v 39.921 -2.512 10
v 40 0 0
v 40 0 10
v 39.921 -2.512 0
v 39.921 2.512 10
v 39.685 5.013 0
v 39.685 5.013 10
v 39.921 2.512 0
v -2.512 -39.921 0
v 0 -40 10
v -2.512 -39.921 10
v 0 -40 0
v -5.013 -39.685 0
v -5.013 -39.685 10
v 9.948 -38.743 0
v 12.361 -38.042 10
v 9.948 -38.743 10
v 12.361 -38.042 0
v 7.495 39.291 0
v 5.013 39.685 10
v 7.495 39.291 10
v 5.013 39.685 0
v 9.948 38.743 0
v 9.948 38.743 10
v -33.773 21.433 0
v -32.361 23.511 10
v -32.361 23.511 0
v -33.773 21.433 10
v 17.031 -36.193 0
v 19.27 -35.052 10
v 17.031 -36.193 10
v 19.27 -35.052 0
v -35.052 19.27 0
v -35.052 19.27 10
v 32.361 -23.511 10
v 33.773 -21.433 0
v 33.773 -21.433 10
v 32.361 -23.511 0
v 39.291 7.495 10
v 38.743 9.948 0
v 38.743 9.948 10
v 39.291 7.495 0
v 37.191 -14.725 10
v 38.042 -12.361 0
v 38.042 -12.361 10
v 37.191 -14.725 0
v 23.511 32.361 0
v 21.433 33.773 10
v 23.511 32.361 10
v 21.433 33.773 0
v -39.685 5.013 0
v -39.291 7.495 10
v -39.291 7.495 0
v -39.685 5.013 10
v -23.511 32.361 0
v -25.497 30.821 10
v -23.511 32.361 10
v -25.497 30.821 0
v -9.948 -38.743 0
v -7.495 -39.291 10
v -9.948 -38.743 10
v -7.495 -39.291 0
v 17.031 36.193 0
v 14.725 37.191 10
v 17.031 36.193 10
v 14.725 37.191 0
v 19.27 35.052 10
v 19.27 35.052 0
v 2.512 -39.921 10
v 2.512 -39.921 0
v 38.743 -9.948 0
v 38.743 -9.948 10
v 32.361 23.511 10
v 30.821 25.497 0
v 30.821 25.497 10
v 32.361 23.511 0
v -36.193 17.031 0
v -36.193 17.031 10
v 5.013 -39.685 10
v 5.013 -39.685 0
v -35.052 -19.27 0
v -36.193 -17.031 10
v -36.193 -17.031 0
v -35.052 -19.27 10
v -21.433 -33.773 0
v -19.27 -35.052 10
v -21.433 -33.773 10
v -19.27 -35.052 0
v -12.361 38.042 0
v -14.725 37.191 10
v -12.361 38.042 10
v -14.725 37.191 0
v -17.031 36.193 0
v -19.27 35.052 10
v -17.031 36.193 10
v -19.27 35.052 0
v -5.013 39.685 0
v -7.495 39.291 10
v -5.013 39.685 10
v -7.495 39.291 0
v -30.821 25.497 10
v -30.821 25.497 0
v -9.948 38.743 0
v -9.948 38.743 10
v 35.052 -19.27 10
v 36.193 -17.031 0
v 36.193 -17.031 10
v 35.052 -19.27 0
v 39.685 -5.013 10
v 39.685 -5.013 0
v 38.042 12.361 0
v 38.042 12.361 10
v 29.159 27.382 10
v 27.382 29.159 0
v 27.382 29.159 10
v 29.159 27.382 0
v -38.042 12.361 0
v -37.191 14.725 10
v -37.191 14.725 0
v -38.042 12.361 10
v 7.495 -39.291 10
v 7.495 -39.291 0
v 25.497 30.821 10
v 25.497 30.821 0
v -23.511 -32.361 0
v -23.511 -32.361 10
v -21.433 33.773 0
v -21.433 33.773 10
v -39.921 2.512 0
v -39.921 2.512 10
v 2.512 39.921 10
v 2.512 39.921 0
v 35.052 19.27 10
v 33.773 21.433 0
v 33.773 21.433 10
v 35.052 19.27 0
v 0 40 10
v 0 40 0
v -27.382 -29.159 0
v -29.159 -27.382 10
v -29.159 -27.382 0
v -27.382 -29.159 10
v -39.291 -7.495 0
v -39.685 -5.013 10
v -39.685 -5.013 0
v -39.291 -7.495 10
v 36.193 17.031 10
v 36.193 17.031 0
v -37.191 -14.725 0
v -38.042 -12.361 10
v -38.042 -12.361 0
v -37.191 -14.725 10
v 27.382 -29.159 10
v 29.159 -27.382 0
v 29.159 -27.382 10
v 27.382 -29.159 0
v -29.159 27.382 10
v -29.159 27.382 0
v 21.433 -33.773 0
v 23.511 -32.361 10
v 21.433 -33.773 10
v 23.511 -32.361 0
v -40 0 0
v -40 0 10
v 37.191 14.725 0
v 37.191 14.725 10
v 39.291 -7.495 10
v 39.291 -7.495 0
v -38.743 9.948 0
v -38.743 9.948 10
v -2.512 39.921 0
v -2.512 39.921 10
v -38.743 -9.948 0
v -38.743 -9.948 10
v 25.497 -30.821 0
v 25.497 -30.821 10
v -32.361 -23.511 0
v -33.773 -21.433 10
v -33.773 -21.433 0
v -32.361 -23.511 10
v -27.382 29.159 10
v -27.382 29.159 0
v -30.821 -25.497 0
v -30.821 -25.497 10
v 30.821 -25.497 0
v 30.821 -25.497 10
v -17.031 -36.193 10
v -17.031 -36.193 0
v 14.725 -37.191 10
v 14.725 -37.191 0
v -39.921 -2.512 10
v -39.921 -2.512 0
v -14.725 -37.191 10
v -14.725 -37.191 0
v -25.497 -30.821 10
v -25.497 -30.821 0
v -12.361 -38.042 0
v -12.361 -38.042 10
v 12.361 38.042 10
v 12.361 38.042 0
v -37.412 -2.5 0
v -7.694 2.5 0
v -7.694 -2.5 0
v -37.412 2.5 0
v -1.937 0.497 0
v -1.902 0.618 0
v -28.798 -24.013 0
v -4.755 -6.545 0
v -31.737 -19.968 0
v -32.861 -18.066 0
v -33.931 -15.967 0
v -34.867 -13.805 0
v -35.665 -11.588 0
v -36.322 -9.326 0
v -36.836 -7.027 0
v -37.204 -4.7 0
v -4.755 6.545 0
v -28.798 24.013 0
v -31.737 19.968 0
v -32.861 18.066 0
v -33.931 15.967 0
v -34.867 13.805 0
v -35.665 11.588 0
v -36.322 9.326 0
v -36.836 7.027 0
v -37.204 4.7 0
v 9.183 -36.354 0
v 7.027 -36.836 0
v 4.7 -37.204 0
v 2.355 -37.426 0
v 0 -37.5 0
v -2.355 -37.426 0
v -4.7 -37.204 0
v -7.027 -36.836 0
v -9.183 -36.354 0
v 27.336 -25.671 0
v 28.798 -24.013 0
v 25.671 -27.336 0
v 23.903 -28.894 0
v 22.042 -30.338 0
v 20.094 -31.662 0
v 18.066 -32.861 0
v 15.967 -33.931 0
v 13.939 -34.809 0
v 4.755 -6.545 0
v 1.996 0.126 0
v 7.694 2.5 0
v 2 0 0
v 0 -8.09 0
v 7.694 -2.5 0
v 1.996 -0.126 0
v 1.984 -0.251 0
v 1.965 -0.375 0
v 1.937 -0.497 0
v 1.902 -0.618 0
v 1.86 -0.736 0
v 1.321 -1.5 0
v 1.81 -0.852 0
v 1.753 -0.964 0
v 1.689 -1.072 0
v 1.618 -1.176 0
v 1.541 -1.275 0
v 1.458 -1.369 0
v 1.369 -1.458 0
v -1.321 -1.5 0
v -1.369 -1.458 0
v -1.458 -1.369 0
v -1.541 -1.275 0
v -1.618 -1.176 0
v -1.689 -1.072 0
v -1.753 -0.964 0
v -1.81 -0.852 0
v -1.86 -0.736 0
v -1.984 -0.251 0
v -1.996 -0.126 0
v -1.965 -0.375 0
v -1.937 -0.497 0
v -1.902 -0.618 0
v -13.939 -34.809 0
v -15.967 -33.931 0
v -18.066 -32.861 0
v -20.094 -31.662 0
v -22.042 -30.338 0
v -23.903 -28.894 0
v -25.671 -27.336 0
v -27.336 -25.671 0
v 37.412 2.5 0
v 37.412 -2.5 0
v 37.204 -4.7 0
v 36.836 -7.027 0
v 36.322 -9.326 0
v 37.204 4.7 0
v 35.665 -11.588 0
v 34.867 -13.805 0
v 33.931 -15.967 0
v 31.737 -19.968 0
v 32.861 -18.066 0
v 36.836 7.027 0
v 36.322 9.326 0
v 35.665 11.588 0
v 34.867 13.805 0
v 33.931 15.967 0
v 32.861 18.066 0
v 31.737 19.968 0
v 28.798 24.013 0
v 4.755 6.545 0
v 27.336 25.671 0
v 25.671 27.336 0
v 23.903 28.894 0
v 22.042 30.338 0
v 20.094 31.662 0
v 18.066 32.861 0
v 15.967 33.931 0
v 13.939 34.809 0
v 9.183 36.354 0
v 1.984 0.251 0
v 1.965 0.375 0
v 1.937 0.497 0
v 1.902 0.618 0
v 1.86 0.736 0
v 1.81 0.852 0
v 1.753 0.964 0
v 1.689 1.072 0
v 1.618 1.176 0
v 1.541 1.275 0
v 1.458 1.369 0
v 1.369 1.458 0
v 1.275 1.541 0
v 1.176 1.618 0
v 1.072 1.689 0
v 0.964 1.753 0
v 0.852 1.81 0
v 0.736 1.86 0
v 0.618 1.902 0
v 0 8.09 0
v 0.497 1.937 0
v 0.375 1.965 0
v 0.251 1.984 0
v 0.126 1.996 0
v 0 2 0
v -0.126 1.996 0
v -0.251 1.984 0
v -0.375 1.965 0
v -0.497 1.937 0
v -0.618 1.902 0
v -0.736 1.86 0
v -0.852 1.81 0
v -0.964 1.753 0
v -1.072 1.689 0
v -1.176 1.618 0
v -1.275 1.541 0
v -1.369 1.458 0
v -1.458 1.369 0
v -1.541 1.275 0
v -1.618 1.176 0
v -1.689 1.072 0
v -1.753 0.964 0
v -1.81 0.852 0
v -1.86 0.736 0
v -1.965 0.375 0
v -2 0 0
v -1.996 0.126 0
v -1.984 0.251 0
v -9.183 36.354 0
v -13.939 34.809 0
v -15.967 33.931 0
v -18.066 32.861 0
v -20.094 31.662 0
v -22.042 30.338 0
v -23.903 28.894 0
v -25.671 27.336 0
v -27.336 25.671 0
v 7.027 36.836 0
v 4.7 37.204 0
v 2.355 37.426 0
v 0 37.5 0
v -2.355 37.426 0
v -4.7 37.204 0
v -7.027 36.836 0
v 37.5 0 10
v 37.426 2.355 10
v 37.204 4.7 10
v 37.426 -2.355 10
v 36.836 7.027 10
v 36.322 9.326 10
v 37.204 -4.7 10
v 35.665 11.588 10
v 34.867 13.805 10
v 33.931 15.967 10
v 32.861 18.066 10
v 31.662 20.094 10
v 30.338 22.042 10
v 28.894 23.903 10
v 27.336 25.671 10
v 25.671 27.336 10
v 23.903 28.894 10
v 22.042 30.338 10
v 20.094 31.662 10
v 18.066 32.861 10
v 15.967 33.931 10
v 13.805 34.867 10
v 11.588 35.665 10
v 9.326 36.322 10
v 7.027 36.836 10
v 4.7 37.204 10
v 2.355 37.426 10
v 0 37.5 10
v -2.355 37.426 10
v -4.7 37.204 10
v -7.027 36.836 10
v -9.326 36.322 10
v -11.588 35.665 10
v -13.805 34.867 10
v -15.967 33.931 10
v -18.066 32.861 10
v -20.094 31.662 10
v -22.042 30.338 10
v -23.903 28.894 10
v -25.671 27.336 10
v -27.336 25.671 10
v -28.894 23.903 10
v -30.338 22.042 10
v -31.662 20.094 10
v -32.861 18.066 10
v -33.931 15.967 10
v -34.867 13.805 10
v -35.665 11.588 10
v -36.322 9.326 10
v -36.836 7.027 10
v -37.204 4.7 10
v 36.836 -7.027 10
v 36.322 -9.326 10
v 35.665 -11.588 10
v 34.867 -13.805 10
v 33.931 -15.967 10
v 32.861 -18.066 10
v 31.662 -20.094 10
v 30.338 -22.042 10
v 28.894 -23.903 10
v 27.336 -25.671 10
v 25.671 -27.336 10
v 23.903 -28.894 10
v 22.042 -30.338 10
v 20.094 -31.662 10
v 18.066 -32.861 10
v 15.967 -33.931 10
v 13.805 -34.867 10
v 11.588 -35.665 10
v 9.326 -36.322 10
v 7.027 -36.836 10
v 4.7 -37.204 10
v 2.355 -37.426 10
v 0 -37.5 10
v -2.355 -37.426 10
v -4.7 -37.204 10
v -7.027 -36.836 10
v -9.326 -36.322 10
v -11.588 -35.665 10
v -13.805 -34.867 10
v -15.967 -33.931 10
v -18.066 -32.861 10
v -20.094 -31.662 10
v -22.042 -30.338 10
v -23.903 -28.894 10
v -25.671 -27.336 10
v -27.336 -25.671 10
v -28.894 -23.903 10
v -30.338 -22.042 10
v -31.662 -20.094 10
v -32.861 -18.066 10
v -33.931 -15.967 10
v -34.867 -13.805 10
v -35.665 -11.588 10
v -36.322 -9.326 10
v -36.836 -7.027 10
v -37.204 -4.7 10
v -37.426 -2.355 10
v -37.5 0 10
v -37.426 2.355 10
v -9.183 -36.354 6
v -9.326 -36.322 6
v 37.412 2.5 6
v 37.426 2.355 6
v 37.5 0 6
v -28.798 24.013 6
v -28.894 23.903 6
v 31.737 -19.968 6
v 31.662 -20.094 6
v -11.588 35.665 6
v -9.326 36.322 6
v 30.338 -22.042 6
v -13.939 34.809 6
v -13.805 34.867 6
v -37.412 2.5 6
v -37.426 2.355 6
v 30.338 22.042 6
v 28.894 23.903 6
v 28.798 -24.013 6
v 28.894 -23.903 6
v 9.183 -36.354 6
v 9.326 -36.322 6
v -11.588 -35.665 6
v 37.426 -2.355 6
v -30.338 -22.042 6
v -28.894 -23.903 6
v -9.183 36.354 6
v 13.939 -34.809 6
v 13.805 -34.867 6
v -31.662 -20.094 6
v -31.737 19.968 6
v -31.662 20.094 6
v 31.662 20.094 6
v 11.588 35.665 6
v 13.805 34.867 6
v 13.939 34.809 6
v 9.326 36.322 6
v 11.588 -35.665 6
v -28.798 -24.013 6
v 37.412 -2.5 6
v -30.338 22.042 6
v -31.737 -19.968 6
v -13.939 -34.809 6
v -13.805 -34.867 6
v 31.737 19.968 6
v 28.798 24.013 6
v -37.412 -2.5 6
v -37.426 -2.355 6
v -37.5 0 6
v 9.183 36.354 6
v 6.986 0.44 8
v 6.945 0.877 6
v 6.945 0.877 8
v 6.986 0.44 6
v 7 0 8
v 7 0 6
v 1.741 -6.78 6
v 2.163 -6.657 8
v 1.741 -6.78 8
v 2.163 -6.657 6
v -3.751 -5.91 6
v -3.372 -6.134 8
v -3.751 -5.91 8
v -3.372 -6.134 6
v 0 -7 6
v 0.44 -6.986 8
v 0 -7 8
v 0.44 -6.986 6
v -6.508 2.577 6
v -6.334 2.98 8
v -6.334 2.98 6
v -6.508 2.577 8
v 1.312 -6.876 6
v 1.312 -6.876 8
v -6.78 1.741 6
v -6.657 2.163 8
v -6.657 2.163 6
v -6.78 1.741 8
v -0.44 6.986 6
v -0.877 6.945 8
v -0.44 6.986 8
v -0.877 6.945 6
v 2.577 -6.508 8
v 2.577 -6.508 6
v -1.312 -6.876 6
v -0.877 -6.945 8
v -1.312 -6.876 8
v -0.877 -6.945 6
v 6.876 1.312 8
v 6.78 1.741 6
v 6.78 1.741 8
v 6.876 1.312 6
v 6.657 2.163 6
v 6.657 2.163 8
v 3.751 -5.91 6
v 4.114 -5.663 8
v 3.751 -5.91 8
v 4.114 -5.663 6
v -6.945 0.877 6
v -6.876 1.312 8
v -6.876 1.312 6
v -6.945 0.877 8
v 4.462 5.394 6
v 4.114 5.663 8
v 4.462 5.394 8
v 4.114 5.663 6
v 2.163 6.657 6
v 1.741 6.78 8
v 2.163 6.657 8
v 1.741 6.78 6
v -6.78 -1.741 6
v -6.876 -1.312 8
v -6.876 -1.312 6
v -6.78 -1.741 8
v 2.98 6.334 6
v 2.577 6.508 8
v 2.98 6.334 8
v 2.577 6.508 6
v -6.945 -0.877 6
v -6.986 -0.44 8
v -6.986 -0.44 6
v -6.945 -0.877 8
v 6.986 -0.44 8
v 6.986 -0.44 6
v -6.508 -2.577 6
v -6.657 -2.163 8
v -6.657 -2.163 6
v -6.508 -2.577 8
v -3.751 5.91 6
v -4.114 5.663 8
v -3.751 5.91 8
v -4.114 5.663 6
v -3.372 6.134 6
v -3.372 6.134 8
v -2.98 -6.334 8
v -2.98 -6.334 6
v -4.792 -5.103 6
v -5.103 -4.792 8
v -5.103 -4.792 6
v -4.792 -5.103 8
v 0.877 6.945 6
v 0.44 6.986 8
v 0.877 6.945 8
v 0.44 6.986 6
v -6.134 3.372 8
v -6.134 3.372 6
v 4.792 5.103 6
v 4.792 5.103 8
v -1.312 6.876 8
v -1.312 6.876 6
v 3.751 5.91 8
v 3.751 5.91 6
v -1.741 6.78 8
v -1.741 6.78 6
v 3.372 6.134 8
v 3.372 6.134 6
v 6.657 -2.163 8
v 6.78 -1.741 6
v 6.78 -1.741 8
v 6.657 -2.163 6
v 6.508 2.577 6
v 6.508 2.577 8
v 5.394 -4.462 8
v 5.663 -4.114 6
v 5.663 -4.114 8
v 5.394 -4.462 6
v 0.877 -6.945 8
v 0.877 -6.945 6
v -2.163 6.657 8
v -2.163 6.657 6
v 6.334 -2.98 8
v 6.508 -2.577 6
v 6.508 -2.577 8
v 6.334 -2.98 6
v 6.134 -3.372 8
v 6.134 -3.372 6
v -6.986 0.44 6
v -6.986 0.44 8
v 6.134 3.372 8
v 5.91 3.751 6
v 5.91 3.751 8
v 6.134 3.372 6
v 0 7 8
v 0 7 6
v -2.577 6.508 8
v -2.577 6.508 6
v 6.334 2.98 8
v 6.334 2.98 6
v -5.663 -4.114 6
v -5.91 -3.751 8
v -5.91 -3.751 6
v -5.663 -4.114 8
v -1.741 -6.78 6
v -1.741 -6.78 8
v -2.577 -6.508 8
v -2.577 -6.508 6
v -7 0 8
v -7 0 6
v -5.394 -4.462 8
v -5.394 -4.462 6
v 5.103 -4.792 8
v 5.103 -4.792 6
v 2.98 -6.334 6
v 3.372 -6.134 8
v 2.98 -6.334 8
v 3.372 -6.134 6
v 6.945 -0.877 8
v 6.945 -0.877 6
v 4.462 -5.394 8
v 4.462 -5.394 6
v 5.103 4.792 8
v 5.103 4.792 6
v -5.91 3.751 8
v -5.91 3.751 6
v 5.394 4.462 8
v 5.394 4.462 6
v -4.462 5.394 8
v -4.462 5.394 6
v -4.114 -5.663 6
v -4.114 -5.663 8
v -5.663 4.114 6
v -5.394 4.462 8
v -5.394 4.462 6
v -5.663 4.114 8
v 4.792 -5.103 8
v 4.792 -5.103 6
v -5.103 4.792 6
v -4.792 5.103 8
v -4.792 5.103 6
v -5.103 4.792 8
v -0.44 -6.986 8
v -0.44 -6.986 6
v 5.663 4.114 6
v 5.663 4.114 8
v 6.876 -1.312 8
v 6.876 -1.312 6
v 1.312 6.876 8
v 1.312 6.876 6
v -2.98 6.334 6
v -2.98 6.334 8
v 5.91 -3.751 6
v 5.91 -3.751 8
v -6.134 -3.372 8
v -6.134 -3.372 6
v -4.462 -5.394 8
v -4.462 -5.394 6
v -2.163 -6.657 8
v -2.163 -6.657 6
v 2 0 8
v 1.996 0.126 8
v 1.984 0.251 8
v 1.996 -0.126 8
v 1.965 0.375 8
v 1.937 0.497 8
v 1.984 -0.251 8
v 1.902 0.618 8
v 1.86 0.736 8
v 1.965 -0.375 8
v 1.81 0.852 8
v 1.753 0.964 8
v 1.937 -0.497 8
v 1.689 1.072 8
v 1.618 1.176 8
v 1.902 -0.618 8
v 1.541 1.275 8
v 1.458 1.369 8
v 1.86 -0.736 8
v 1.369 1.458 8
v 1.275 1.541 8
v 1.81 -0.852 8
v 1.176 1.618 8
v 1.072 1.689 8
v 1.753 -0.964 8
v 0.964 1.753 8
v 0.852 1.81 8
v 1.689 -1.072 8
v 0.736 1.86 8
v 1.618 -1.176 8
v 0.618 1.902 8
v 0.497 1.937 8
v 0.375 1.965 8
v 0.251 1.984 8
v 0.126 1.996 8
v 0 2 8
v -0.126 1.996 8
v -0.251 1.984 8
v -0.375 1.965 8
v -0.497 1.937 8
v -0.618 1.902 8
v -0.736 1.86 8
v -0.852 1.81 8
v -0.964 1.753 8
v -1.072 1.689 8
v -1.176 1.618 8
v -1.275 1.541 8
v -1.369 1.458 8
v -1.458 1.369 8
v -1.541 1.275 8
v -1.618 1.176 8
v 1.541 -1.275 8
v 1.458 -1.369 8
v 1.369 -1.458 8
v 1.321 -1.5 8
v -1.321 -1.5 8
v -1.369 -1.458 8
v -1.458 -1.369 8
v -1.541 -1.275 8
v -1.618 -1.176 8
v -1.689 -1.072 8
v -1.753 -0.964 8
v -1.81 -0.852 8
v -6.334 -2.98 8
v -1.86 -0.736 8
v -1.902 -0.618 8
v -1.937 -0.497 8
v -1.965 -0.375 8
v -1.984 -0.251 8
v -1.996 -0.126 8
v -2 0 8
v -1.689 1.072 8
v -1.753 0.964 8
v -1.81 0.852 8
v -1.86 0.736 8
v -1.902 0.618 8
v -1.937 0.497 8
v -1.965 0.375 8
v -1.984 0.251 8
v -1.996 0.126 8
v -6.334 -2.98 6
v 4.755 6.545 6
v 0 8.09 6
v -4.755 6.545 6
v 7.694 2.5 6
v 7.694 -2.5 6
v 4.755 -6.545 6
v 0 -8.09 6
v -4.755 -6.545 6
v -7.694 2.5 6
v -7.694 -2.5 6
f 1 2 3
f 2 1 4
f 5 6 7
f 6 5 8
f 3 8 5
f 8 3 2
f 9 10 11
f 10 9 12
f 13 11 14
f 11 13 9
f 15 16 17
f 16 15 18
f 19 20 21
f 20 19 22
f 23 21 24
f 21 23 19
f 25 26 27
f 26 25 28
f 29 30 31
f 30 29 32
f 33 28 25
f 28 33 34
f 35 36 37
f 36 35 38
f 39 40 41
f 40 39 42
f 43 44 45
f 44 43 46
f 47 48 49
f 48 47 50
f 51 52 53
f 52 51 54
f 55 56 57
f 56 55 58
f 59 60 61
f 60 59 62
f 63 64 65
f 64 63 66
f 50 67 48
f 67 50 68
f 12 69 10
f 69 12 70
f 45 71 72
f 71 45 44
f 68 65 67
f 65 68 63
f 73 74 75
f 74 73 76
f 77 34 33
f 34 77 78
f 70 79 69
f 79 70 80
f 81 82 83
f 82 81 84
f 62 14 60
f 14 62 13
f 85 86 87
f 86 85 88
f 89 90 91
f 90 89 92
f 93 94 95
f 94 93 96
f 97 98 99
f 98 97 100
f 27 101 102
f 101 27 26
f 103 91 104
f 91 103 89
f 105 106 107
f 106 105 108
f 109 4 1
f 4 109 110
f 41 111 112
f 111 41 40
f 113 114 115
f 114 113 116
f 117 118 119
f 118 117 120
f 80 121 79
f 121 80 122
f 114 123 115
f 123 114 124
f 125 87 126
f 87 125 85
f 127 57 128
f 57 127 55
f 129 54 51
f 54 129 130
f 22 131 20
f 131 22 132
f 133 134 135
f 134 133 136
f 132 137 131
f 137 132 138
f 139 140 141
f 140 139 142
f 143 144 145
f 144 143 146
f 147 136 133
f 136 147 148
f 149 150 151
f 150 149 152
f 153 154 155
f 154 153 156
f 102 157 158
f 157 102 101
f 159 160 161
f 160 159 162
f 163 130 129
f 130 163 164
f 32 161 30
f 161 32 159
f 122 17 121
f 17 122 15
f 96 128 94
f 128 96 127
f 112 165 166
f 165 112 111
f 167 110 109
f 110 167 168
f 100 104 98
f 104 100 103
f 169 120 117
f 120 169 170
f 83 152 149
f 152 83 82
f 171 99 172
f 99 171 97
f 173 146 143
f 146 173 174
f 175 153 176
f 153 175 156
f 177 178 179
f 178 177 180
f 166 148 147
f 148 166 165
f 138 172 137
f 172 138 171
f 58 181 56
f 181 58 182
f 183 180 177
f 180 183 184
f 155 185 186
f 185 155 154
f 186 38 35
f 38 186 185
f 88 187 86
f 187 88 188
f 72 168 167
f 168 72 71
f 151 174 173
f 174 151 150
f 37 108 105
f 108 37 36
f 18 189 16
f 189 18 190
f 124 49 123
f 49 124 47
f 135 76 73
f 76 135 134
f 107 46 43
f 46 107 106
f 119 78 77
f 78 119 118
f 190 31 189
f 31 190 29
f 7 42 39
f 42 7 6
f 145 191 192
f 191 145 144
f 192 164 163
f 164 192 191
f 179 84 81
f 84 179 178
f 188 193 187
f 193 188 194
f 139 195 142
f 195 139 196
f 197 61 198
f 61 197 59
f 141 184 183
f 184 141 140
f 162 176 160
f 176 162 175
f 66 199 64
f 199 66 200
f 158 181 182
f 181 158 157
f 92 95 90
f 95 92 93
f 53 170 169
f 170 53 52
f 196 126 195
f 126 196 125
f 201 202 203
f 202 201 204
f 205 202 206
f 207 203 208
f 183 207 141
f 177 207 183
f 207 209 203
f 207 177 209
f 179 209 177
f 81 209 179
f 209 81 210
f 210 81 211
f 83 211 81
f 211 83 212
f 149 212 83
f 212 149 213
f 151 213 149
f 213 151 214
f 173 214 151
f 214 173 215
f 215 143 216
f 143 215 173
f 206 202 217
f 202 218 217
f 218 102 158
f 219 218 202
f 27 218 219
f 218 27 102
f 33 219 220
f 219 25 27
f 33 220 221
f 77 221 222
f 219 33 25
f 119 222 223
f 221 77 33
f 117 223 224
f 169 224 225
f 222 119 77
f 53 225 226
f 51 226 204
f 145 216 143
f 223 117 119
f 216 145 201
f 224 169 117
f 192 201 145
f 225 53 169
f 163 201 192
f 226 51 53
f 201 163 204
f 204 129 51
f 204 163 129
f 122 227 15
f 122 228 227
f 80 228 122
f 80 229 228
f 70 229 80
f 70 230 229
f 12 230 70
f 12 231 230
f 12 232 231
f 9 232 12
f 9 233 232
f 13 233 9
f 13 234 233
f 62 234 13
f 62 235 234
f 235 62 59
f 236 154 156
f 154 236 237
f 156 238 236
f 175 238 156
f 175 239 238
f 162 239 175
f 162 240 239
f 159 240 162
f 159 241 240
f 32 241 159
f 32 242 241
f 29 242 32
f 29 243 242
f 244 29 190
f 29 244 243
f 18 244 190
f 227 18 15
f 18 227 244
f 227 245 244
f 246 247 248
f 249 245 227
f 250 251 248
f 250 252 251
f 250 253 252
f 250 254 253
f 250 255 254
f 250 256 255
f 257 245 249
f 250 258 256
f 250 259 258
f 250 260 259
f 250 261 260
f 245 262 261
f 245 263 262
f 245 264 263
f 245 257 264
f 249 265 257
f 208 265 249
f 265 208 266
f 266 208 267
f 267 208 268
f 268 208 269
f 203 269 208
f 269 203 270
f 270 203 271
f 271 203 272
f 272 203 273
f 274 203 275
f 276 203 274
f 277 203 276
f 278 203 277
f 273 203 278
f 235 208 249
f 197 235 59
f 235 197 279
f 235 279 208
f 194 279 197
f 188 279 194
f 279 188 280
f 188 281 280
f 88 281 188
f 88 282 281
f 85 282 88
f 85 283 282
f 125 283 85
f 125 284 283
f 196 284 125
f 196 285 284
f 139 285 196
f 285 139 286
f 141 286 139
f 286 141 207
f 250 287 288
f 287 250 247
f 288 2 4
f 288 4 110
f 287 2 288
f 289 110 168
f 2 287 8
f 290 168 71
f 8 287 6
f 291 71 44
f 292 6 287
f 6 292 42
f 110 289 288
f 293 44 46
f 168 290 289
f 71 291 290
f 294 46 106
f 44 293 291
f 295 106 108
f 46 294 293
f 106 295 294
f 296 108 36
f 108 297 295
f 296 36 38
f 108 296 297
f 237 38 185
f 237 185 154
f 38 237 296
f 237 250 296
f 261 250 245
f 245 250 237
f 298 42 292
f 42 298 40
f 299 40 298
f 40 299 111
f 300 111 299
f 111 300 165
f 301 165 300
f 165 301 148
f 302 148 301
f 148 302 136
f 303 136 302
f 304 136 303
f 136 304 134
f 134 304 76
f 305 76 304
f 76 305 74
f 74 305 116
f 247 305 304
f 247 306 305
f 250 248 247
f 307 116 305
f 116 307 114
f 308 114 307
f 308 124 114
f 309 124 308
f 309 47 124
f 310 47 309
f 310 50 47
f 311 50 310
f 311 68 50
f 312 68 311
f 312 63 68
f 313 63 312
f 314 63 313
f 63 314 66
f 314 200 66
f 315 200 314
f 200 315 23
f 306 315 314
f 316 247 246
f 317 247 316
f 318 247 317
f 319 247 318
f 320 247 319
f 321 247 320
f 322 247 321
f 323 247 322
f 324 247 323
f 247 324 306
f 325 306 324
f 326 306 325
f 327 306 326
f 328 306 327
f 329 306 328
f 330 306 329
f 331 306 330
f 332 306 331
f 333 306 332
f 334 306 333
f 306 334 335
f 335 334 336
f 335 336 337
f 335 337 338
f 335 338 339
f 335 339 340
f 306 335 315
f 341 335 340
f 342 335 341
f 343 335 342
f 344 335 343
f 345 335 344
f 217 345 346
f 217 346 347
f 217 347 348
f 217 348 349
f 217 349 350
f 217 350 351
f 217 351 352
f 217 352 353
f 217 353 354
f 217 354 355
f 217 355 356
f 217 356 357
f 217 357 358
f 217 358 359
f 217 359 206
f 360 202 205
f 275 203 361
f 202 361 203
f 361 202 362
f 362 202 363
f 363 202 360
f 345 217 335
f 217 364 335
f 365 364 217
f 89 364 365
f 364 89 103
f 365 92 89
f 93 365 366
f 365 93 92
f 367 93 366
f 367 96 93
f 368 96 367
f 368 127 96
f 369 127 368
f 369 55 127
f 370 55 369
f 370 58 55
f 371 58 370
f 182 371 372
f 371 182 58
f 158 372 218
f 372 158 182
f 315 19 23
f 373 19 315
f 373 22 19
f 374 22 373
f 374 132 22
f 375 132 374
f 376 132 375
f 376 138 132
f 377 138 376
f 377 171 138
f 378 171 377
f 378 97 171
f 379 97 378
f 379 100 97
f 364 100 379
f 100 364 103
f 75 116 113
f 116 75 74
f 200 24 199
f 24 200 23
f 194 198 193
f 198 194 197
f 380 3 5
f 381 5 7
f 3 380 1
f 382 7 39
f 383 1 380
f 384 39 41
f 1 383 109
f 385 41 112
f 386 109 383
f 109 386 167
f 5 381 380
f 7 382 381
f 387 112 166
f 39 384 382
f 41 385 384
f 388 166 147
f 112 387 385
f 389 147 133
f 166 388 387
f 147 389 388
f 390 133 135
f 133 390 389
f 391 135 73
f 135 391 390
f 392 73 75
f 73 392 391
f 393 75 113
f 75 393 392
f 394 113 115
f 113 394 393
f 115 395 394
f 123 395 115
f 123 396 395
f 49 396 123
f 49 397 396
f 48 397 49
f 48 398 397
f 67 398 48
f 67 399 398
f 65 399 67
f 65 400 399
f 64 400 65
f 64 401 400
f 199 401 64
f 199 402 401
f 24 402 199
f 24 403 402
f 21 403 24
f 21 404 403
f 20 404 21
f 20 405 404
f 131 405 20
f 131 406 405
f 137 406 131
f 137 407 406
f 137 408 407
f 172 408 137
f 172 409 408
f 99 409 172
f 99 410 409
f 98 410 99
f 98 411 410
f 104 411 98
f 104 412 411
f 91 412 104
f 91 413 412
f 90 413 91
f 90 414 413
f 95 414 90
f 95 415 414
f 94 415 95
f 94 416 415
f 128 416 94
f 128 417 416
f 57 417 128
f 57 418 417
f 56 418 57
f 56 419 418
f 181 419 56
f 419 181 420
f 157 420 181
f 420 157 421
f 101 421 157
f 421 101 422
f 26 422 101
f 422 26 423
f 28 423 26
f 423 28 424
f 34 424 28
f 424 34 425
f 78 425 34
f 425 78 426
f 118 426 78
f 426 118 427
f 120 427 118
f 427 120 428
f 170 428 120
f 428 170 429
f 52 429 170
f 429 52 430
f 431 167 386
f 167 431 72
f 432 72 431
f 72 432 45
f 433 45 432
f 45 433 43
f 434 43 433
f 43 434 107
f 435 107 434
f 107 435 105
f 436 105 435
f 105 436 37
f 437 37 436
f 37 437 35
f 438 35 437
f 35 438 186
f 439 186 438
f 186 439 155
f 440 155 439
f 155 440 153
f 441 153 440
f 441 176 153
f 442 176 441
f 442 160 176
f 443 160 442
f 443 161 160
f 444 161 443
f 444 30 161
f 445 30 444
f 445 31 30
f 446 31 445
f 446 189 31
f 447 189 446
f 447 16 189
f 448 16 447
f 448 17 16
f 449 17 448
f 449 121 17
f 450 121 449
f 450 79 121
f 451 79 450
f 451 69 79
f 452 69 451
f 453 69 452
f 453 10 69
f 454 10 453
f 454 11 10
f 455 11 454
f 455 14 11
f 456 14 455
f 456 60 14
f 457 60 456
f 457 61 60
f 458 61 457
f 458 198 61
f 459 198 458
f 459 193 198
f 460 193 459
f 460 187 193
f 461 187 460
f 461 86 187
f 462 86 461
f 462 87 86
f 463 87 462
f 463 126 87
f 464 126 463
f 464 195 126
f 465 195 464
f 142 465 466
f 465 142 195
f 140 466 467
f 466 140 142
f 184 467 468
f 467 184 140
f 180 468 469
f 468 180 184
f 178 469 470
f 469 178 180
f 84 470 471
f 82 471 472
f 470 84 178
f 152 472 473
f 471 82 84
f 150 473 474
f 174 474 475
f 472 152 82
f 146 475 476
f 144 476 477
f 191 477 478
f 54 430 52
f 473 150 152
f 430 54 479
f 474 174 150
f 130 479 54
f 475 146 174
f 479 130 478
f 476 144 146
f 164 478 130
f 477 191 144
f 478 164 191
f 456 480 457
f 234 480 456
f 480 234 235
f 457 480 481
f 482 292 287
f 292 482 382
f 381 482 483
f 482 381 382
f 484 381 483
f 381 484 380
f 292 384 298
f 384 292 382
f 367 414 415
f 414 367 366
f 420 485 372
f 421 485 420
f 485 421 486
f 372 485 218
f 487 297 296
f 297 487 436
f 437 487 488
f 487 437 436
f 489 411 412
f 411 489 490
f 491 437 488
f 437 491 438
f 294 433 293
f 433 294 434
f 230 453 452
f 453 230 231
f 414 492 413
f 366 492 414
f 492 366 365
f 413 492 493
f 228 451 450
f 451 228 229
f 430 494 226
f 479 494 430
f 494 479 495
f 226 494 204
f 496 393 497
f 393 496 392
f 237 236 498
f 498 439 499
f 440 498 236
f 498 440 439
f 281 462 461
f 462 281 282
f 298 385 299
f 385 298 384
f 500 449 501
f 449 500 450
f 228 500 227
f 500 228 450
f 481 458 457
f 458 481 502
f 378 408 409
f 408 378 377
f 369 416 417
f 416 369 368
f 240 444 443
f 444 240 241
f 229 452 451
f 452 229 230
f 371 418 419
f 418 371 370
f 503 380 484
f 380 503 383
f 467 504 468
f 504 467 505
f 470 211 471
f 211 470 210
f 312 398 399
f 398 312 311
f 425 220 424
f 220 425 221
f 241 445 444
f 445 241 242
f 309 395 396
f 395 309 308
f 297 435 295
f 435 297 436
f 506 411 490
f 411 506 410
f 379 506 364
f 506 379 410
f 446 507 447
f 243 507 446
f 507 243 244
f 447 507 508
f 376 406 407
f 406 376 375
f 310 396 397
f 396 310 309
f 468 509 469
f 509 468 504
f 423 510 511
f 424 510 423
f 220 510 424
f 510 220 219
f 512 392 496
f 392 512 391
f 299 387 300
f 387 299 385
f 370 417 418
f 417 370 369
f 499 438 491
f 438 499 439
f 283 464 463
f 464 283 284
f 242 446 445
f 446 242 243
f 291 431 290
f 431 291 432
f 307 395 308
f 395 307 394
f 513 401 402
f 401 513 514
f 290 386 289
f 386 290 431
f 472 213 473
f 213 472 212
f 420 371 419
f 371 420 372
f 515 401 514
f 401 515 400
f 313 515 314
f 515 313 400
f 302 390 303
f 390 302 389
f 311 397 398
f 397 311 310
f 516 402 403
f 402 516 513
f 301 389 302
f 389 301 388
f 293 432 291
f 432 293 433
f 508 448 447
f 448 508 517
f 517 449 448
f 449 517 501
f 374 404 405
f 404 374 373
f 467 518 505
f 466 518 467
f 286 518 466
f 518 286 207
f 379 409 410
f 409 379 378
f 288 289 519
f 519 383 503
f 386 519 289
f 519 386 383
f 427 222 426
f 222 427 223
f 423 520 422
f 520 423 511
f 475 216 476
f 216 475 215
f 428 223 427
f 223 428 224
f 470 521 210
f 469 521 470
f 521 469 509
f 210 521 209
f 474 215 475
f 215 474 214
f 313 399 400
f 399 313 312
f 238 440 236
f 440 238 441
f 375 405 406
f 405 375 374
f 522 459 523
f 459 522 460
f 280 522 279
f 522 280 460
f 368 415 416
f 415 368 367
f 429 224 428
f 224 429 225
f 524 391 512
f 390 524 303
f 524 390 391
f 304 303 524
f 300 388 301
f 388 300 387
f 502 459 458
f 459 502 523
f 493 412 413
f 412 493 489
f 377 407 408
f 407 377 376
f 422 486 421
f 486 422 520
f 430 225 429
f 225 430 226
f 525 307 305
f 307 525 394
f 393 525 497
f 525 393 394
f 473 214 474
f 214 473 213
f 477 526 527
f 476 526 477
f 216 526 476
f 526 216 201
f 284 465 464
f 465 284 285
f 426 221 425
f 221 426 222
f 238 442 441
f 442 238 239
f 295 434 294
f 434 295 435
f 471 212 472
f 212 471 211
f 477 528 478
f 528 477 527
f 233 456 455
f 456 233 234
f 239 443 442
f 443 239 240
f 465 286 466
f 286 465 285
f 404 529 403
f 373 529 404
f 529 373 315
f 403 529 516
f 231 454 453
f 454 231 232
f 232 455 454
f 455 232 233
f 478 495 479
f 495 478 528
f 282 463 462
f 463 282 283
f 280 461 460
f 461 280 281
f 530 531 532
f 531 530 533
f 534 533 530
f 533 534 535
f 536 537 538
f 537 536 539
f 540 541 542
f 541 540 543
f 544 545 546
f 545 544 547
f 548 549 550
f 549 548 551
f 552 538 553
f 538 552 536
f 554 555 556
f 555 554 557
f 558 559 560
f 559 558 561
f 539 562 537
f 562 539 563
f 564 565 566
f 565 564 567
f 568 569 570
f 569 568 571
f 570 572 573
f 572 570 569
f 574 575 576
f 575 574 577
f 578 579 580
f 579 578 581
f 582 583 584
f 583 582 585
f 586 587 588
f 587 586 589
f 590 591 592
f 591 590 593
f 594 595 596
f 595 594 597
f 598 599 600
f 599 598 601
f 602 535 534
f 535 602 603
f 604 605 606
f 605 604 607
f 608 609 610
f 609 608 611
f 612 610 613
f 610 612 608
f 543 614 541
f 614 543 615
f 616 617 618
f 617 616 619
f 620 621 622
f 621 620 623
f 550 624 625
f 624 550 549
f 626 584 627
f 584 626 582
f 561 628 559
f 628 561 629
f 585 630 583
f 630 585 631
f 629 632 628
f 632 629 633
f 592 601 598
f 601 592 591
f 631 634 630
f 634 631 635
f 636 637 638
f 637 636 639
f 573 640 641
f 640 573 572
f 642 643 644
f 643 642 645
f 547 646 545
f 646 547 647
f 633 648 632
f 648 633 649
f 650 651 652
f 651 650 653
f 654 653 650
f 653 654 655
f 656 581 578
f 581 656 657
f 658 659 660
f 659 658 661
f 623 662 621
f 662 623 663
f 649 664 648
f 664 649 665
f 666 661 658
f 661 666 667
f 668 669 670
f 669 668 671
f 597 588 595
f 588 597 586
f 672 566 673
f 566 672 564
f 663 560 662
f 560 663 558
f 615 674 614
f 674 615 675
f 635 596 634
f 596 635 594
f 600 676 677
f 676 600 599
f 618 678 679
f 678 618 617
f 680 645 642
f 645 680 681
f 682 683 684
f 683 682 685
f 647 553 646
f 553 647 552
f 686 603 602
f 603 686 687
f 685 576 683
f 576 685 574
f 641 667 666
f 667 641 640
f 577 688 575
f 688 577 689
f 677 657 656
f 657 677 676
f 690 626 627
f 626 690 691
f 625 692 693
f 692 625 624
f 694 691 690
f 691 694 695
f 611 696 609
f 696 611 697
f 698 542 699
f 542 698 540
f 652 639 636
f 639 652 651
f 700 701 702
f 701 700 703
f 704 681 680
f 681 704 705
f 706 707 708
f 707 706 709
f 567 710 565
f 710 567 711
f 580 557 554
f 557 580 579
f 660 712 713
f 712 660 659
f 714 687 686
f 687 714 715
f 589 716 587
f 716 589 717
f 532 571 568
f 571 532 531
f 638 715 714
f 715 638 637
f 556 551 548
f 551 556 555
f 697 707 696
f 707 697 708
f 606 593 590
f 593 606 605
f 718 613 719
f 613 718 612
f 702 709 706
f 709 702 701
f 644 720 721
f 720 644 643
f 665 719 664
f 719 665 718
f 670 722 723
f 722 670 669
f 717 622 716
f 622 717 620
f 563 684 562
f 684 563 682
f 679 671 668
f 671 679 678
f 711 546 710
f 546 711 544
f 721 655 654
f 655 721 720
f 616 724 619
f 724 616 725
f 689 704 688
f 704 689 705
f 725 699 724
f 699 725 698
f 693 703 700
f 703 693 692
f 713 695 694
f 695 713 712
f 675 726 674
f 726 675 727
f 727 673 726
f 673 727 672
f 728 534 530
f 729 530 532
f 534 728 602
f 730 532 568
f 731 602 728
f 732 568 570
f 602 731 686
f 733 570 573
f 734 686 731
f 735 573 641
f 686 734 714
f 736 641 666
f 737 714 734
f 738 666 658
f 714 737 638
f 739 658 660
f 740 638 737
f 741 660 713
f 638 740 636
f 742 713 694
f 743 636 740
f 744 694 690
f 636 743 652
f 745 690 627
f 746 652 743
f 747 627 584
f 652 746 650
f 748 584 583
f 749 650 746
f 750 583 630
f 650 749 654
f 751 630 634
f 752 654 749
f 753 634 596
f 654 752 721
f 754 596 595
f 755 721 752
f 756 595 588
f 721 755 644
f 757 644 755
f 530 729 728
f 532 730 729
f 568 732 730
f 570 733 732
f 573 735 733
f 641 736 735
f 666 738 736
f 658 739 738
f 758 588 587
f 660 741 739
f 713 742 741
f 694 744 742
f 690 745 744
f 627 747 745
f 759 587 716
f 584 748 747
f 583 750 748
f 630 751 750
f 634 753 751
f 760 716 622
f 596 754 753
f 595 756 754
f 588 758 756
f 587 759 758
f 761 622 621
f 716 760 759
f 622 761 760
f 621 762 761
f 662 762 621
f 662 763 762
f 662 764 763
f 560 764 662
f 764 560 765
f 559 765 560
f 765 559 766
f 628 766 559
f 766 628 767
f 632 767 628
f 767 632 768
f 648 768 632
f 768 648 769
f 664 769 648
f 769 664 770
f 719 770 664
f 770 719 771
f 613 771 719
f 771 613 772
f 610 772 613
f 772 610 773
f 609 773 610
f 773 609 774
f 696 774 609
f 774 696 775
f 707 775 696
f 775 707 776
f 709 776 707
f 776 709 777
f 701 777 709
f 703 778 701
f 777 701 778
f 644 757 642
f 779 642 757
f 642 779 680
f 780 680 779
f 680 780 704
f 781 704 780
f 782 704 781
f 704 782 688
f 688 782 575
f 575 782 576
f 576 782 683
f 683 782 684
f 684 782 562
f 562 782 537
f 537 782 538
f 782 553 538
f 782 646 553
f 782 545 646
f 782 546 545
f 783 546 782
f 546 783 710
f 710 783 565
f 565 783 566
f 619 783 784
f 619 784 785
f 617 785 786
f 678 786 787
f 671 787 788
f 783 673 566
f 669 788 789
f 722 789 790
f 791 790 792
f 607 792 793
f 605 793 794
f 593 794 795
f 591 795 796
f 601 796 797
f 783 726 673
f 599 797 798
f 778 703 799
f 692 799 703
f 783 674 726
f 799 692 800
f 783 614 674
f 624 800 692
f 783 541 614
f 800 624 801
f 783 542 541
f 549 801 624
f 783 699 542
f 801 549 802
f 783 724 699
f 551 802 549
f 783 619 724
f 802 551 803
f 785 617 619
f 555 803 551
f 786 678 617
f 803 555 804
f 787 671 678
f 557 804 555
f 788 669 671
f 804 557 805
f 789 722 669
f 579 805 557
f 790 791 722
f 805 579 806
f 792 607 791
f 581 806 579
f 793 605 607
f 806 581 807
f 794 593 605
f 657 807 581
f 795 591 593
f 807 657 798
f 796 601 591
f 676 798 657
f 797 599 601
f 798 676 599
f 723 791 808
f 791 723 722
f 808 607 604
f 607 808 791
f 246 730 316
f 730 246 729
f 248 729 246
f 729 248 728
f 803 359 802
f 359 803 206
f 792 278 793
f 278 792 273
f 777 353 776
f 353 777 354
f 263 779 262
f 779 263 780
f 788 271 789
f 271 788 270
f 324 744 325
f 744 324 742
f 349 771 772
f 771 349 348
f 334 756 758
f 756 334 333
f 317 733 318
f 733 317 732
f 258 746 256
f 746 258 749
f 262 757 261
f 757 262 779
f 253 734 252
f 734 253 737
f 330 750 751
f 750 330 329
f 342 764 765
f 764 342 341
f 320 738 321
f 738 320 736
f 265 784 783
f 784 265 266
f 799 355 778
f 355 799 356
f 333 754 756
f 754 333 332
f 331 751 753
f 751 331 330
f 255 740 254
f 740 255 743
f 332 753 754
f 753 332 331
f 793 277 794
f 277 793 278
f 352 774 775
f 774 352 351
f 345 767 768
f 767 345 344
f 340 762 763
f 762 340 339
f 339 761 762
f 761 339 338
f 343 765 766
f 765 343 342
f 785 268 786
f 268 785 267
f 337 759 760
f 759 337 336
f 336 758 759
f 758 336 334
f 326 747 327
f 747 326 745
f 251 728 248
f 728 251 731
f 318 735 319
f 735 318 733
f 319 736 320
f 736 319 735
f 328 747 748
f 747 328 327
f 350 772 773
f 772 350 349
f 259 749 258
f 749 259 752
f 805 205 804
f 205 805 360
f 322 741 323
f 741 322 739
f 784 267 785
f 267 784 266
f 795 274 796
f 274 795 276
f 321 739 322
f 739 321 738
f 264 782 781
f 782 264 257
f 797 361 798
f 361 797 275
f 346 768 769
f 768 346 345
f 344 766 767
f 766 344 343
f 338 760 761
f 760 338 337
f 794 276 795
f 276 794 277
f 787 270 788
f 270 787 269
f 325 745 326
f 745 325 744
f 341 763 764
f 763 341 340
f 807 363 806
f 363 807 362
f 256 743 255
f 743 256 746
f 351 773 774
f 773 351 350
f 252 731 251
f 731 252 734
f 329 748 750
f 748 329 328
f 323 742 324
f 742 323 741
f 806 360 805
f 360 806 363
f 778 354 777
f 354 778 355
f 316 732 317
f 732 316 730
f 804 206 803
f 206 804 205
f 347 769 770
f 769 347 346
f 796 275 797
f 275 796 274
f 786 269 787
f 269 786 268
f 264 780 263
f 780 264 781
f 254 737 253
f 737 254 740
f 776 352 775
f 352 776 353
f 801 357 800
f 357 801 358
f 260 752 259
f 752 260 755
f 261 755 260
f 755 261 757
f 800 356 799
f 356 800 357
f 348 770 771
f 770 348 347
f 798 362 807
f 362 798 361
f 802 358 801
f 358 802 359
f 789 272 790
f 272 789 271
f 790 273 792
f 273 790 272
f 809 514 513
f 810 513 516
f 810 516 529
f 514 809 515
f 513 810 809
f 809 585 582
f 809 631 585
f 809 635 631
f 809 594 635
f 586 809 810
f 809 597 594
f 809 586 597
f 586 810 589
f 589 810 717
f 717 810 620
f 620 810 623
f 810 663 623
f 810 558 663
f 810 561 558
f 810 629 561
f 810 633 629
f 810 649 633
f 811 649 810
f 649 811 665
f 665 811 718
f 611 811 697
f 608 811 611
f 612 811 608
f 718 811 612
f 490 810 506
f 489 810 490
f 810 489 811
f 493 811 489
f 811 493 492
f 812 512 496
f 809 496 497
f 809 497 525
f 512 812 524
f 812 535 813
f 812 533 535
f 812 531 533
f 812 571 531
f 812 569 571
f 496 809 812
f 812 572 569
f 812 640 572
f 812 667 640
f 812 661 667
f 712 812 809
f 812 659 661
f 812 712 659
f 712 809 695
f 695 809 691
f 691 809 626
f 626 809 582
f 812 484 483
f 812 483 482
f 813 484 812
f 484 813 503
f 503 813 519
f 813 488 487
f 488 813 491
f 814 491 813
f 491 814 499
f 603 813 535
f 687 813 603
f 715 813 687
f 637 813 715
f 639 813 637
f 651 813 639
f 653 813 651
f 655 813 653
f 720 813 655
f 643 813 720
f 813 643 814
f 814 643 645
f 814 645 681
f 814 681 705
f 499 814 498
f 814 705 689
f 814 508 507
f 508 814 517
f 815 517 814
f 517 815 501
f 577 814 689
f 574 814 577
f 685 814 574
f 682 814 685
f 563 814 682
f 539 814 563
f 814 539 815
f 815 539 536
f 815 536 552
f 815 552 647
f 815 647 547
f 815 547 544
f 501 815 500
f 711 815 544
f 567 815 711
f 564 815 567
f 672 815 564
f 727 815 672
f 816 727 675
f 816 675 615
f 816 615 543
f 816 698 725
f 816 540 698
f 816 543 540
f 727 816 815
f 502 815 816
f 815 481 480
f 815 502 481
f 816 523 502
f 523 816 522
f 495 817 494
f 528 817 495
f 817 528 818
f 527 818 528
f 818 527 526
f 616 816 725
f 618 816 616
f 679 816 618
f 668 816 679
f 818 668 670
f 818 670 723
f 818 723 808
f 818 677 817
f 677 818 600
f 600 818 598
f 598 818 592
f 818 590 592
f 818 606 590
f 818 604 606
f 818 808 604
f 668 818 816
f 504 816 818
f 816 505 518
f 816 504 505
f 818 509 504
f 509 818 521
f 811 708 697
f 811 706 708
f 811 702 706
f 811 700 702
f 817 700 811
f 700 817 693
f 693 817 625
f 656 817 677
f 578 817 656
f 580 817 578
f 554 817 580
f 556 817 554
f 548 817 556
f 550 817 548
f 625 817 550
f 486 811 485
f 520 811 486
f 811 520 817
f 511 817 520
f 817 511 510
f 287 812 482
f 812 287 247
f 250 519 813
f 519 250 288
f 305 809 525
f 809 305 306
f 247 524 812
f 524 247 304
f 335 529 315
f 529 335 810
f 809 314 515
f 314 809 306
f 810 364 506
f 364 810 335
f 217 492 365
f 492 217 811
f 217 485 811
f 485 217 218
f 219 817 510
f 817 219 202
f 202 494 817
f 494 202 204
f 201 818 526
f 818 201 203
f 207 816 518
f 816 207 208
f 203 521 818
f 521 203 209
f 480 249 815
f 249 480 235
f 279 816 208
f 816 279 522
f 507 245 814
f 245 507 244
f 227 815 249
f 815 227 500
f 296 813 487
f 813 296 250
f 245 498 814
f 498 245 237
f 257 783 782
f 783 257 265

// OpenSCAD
/*
 * Wheel Generator v1.1
 *
 * http://www.thingiverse.com/thing:1887576
 *
 * By: Maxstupo
 */

// (The outer diameter of the wheel):
outerDiameter = 80; 

// (The width of the wheel):
treadWidth = 10;

// (The thickness of the outer wheel ring):
treadThickness = 5; 

// (The axle diameter):
shaftDiameter = 4; 

// (The thickness of the hub):
hubThickness = 10; 

// (The width of the hub):
hubWidth = 8; 

// (The width of the keyed hole, set to zero to disable):
keyWidth = 3.5; 

// (Number of spokes):
spokeCount = 10;

// (The width of each spoke):
spokeWidth = 5; 

// (The height of each spoke in Z axis):
spokeThickness = 6;

/* [Misc] */
$fn = 100;

makeWheel(outerDiameter,treadWidth,treadThickness,shaftDiameter,hubThickness,hubWidth,keyWidth,spokeCount,spokeWidth,spokeThickness);

module makeWheel(outerDiameter=80, treadWidth=10, treadThickness=5, shaftDiameter=4, hubThickness=10,hubWidth=8,keyWidth=1.5,spokeCount=10,spokeWidth=5,spokeThickness=6){
union(){
    hollowCylinder(outerDiameter, outerDiameter - treadThickness, treadWidth); // The "wheel"
 
    union(){
       hollowCylinder(shaftDiameter + hubThickness, shaftDiameter, hubWidth); // The wheel hub
        
        // Spokes
        difference(){
            union(){
                for (i = [0 : (360 / spokeCount) : 360]) {
                    rotate([0, 0, i]) translate([0, -spokeWidth / 2, 0]) cube([outerDiameter / 2, spokeWidth, spokeThickness]);   
                }
            }
            translate([0, 0, -1]) cylinder(h=spokeThickness + 2, d=shaftDiameter);
            translate([0, 0, -1]) hollowCylinder(outerDiameter + treadThickness, outerDiameter, spokeThickness + 2);
        }
         
        // Make the shaft hole keyed
        if(keyWidth>0){
            difference(){
                translate([-shaftDiameter / 2, -shaftDiameter / 2, 0]) cube([shaftDiameter, shaftDiameter - keyWidth, hubWidth]);
                translate([0, 0, -1]) hollowCylinder(outerDiameter - treadThickness, shaftDiameter + hubThickness, hubWidth + 2);
            }
        }
    }
}
}

module hollowCylinder(od, id, h){
    difference(){
        cylinder(d=od, h=h);
        translate([0, 0, -1]) cylinder(d=id, h=h + 2);
    }
}
